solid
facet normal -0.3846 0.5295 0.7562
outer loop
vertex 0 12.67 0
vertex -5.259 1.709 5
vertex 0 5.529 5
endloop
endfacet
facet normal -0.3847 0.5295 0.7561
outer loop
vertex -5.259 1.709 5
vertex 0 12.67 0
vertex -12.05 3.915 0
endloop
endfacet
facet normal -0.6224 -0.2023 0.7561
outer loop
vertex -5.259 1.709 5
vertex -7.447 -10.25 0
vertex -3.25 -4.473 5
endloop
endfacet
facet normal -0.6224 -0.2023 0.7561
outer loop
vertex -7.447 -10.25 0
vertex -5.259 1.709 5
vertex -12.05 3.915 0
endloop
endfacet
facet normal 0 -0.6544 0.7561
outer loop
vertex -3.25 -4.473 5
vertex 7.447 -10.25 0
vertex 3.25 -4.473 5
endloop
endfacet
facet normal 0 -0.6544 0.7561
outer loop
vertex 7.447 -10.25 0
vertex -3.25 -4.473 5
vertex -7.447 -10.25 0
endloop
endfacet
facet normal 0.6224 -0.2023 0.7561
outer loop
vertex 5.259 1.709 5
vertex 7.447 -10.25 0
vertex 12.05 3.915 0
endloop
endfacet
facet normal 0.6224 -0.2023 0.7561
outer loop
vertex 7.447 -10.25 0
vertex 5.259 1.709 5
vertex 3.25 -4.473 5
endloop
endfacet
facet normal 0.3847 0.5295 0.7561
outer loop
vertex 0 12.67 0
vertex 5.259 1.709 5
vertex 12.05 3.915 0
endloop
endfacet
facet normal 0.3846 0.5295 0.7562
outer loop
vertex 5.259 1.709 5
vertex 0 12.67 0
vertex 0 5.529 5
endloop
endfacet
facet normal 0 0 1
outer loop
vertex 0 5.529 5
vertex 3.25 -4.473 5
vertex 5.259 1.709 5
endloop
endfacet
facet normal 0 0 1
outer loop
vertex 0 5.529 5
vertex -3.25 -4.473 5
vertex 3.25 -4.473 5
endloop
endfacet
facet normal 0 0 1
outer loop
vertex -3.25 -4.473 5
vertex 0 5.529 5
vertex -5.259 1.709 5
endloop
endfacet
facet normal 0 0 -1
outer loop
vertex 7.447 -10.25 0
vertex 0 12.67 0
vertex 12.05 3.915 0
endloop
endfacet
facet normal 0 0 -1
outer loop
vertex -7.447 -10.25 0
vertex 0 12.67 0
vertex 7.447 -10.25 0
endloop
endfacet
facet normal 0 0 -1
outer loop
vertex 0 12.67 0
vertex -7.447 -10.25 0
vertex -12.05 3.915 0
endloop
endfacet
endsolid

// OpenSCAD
// file: dice_mold_base_generator.scad
module triangle_centered_at_incenter(s=13.76, h=0) {
    b = s / sqrt(2);
    points = [for (i = [90, 90 + 120, 90-120]) [cos(i) * b, sin(i) * b]];
    polygon(points);
}



module polygon_centered_at_incenter(s=13.76, n=3, h=5, slope=30) {
    incenter_angle = 360 / n;
    end = n - 1;
    angles = [for (i = [0:end]) (90 + incenter_angle * i)];
    angles_sum = 180 + (n - 3) * 180;
    vertex_angle = angles_sum / n;
    r = 0.5 * s / cos(vertex_angle / 2);
    points = [for (i = angles) [cos(i) * r, sin(i) * r]];
    bigger_r = r + (cos(slope) * (h / sin(slope)));
    bigger_points = [for (i = angles) [cos(i) * bigger_r, sin(i) * bigger_r]];
        
//    polygon(points);
    
//    polygon(bigger_points);
    
    points3d = [for (i = [0:end]) [points[i][0], points[i][1], h]];
    bigger_points3d = [for (i = [0:end]) [bigger_points[i][0], bigger_points[i][1], 0]];
    
    all_points = concat(points3d, bigger_points3d);
//    points = concat(points, [points[0]]);
//    bigger_points = concat(bigger_points, [bigger_points[0]]);
    
    num_points = len(points3d);
    faces = concat([for (i=[0:end]) [i, (i + 1) % n, num_points + (i + 1) % n, num_points + i]], [[for (i = [0:end]) num_points - 1 - i]], [[for (i = [0:end]) num_points + i ]]);
//    echo(points3d);
//    echo(bigger_points3d);
//    echo(all_points);
//    echo(faces);
        
    polyhedron(points=all_points, faces=faces);
}

module generate_d10(bottom_diff=3.8, diameter=17.37, height=29.03) {
    radius = 0.5 * diameter;
    center_angle = 36;
    angles1 = [for (i = [0:4]) (90 + center_angle * i * 2)];
    angles2 = [for (i = angles1) (i + center_angle)];
//    points = [for (i = [0
    points1 = [for (i = angles1) [cos(i) * radius, sin(i) * radius]];
    points2 = [for (i = angles2) [cos(i) * radius, sin(i) * radius]];
    
//    polygon(points1);
//    #polygon(points2);
    
    diff = bottom_diff * 0.5;
    points1_3d = [for (p = points1) [p[0], p[1], diff]];
    points2_3d = [for (p = points2) [p[0], p[1], -diff]];
    
    h2 = height * 0.5;
    top_point = [0, 0, h2];
    bottom_point = [0, 0, -h2];
    all_points = concat(points1_3d, points2_3d, [top_point], [bottom_point]);
    lall = len(all_points);
    t = lall - 2;
    b = lall - 1;
    
    plen = len(points1_3d);
    faces1 = [for (i = [0:plen - 1]) [t, i, plen + i, (i + 1) % plen]];
    faces2 = [for (i = [0:plen-1]) [b, plen + (i + 1) % plen, (i + 1) % plen, plen + i]];
    echo(faces1[2]);
    echo(all_points);
    
    polyhedron(points=all_points, faces=[for (i = [2:2]) faces1[i]]);
//    polyhedron(points=all_points, faces=concat(faces1, faces2));
}

function polar_x(r=5, theta=0) = cos(theta) * r;
function polar_y(r=5, theta=0) = sin(theta) * r;
function oval_x(r1, a, theta) = cos(theta) * (r1 + a * abs(cos(theta)));
function oval_y(r1, a, theta) = sin(theta) * (r1 + a * abs(cos(theta)));
module d10_base(s1=16, s2=6.5, l=18.4, h=5, slope=35) {
    p = (s1 + s2 + l) / 2;
    s3 = 2 * sqrt(p * (p - s1) * (p - s2) * (p - l)) / l;
    h1 = sqrt(s1 * s1 - s3 * s3);
    h2 = sqrt(s2 * s2 - s3 * s3);
    l_half = l / 2;
    above = l_half - h1;
//    diamond = [[0, l_half], [-s3, above], [0, -l_half], [s3, above]];
    
    base_diff = (cos(slope) * (h / sin(slope)));
    
    th1 = atan2(above, s3);
    th2 = atan2(above, -s3);
    small_r = sqrt(s3 * s3 + above * above);
    base_r = small_r + base_diff;
    top_r = l_half;
    angles = [90, th2, 270, th1];
    a_top = (small_r - top_r) / abs(cos(th1));
    base_small_r = sqrt(pow(cos(th2) * base_r, 2) + pow(sin(th2) * base_r, 2));
    a_bot = (base_small_r - (l_half + base_diff)) / abs(cos(th1));
    diamond = [for (t = angles) [oval_x(top_r, a_top, t), oval_y(top_r, a_top, t)]];
    base_points = [for (t = angles) [oval_x(base_r, a_bot, t), oval_y(base_r, a_bot, t)]];
//    polygon(points=diamond);
//    #polygon(points=diamond);
    
    
    
//    base_points = [[0, l_half + base_diff], [cos(th2) * base_r, sin(th2) * base_r], [0, -l_half - base_diff], [cos(th1) * base_r, sin(th1) * base_r]];
//    polygon(points=base_points);
//    base_points = [[0, l_half + base_diff], [-s3 - base_diff, above], [0, -l_half - base_diff], [s3 + base_diff, above]];
//    polygon(points=diamond);
    
    diamond_points3d = [for (i = diamond) [i[0], i[1], 5]];
    base_points3d = [for (i = base_points) [i[0], i[1], 0]];
    all_points = concat(diamond_points3d, base_points3d);
    
    faces = concat([for (i=[0:3]) [i, (i + 1)% 4, 4 + (i + 1)% 4, 4 + i]],
                   [[0, 3, 2, 1]],
                   [[4, 5, 6, 7]]);
    echo("Points", all_points);
    echo("Faces", faces);
    polyhedron(points=all_points, faces=faces); //[for (i=[0:3]) [i, (i + 1)% 4, 4 + (i + 1)% 4, 4 + i]]);
    
//    #polygon(points=base_points);
}


//intersection() {
//translate([0, 0, -5]) rotate([0, 0, 18]) cylinder(h=10, r1=10, r2=0, $fn=5);
//rotate([0, 0, 36 + 18]) translate([0, 0, 5]) rotate([180, 0, 0]) cylinder(h=10, r1=10, r2=0, $fn=5);
//}

////generate_d10(bottom_diff=3.8, diameter=25);

//polyhedron(points=[
//    [0, 12.5, 1.9], // 0
//    [-11.8882, 3.86271, 1.9], // 1
//    [-7.34732, -10.1127, 1.9], // 2
//    [7.34732, -10.1127, 1.9], // 3
//    [11.8882, 3.86271, 1.9], // 4
//    [-7.34732, 10.1127, -1.9], // 5
//    [-11.8882, -3.86271, -1.9], // 6
//    [0, -12.5, -1.9], // 7
//    [11.8882, -3.86271, -1.9], // 8
//    [7.34732, 10.1127, -1.9], // 9
//    [0, 0, 14.515], // 10
//    [0, 0, -14.515]], // 11
//    faces=[[10, 2, 7, 3]]);
//    

//polygon_centered_at_incenter(s=10, n=5, h=5);

// For D4
//translate([-50, 0, 0]) polygon_centered_at_incenter(s=21, n=3, h=5, slope=35);

// For D6
//translate([-30, 20, 0]) polygon_centered_at_incenter(s=13, n=4, h=5, slope=35);

// For D8
//translate([50, 0, 0]) polygon_centered_at_incenter(s=15, n=3, h=5, slope=35);

// For D10
//d10_base();
//translate([0, 0, 0]) polygon_centered_at_incenter(s=15, n=3, h=5, slope=35);

// For D12
//translate([0, -40, 0]) polygon_centered_at_incenter(s=6.5, n=5, h=5, slope=35);

// For D20
//translate([20, 20, 0]) polygon_centered_at_incenter(s=8.7, n=3, h=5, slope=35);

//#triangle_centered_at_incenter();
// main file
use <dice_mold_base_generator.scad>;
// For D12
polygon_centered_at_incenter(s=6.5, n=5, h=5, slope=35);
